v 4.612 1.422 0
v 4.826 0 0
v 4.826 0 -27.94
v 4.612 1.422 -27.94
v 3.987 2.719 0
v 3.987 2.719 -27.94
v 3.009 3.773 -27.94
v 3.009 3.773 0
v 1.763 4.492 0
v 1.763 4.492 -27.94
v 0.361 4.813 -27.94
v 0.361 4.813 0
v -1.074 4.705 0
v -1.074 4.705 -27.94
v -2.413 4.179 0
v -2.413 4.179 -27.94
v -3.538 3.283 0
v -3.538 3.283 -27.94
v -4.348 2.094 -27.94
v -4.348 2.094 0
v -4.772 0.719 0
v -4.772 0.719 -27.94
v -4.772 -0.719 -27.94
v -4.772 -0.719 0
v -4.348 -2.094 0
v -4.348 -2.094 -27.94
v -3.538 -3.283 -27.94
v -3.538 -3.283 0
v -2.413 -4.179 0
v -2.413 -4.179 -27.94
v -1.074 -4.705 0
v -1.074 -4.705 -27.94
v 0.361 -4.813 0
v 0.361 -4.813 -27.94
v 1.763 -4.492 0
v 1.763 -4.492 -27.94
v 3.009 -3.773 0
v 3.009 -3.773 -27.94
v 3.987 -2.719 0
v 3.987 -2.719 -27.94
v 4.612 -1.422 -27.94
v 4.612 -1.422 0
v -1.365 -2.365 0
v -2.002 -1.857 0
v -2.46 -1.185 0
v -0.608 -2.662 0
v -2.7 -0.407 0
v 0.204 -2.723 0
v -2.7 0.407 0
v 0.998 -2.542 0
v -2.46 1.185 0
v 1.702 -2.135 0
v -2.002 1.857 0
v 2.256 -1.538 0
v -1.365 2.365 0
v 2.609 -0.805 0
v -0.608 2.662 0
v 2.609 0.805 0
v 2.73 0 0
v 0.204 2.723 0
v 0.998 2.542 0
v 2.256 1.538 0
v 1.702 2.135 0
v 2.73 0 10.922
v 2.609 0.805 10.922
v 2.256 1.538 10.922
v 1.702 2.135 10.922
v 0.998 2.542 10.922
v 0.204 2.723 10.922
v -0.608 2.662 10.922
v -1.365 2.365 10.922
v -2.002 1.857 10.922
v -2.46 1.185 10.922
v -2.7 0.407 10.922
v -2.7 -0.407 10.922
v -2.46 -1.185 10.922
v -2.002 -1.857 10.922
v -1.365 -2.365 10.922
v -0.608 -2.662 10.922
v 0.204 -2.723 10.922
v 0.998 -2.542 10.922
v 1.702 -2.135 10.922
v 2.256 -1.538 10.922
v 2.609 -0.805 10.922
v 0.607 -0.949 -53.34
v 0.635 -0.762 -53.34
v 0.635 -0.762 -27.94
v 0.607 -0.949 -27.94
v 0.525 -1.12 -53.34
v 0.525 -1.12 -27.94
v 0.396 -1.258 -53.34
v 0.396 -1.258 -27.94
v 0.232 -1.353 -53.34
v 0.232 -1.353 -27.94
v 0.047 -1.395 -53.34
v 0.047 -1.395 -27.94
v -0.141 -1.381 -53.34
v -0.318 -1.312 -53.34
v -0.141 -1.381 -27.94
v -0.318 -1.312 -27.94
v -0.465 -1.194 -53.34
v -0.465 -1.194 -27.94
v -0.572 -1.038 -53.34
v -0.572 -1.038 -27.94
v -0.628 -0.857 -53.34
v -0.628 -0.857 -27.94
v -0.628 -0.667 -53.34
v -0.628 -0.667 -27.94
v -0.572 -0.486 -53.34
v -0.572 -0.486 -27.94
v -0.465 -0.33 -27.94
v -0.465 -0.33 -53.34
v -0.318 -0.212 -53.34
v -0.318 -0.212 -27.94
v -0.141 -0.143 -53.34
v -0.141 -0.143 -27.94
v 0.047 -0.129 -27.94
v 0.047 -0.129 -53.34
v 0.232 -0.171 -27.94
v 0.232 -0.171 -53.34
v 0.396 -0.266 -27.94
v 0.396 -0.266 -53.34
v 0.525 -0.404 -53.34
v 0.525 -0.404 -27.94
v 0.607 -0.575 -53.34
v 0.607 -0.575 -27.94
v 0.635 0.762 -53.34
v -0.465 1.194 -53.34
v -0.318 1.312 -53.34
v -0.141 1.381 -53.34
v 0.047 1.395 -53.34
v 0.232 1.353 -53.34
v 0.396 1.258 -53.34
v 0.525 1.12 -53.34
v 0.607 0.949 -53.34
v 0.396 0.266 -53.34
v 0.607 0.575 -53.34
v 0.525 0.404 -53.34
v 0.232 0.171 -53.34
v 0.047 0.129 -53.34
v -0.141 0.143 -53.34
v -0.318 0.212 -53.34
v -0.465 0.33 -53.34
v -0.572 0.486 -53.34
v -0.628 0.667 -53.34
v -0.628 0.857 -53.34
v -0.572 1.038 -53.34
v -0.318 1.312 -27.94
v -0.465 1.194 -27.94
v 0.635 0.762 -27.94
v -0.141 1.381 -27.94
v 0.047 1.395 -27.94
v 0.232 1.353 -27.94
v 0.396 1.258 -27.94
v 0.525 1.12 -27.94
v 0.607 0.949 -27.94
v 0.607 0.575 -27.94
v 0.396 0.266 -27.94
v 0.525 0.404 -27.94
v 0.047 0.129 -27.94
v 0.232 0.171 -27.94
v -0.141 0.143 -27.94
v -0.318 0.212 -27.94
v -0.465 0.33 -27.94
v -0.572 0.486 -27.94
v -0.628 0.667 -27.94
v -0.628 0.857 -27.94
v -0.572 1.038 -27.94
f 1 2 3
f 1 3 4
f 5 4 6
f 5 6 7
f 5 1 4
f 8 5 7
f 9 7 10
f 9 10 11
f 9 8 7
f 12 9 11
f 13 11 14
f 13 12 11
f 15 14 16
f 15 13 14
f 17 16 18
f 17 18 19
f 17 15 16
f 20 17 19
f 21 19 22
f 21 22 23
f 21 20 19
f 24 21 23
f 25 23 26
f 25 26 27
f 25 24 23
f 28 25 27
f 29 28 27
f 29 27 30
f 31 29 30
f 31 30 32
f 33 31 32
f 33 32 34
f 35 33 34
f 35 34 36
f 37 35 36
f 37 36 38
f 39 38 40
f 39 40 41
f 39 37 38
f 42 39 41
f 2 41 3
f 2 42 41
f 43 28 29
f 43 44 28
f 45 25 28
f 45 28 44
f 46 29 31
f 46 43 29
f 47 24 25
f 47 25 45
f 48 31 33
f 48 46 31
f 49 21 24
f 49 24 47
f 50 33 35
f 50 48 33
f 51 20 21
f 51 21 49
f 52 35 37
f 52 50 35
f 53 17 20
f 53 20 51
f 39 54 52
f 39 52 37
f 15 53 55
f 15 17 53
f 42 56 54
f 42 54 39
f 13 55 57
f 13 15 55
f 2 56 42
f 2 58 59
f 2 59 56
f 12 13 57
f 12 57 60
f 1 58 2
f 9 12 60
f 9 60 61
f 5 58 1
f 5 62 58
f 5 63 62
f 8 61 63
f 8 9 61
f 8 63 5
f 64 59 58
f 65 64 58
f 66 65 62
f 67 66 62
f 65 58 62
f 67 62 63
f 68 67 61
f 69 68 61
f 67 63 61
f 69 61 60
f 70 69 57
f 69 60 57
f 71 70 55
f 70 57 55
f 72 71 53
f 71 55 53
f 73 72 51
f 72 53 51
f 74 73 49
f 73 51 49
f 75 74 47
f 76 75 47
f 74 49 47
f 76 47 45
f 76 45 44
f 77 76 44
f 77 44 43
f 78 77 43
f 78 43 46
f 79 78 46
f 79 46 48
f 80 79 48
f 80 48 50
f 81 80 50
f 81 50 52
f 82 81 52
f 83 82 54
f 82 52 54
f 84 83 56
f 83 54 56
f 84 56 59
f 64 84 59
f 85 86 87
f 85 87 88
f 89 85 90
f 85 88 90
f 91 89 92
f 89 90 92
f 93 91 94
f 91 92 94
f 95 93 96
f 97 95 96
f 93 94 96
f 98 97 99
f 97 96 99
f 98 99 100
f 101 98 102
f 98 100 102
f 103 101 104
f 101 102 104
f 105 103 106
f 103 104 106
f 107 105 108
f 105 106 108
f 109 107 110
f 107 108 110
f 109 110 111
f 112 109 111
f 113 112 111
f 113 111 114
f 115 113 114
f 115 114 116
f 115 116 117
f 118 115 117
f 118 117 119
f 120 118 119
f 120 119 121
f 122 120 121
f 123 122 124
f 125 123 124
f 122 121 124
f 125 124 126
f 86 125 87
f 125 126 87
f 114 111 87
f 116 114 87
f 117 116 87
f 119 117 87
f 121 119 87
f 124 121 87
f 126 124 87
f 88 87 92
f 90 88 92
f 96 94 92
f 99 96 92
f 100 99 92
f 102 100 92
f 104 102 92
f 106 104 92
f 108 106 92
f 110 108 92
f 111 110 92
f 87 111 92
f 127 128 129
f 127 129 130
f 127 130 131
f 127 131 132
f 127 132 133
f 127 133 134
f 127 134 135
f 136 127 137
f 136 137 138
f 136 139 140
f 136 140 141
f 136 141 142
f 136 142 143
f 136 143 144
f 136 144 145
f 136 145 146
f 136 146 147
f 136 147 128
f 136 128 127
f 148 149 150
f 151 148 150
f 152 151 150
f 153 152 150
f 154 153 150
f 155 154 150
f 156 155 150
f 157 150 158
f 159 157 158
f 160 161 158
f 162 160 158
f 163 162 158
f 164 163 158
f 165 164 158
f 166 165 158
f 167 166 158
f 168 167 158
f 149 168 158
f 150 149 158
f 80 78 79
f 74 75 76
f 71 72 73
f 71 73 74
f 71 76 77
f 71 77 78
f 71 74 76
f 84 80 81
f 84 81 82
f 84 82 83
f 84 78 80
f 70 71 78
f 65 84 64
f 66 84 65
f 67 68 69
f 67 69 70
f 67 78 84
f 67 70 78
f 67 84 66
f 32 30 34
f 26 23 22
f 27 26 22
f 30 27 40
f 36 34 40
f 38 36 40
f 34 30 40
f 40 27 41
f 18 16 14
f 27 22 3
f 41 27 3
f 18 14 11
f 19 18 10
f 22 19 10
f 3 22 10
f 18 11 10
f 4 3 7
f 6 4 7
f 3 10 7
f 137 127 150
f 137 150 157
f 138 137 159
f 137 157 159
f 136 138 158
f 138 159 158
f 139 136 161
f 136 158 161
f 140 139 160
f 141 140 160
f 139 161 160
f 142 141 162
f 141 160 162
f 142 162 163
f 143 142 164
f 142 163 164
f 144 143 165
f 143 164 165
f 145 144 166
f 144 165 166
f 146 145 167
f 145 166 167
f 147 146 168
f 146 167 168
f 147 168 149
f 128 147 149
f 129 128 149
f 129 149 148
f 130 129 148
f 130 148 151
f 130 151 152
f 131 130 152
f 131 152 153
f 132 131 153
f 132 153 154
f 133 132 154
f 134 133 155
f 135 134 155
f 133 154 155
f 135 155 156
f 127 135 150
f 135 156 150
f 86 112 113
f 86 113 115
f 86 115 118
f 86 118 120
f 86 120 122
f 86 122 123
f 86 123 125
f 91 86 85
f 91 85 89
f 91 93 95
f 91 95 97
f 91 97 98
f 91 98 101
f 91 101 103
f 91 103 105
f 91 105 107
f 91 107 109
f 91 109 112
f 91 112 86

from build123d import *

# Parameters (mm, degrees)
F0_R     = 2.7305
F1_DEPTH = 10.922
F0_R_2   = 4.826
F2_DEPTH = 27.94
F3_R     = 0.635
F4_DEPTH = 25.4


with BuildPart() as f1:
    # F0 (on Top) → F1 (new body)
    with BuildSketch(Plane.XY):
        Circle(F0_R)
    extrude(amount=F1_DEPTH)

    # F0 (on Top) → F2 (join)
    with BuildSketch(Plane.XY):
        Circle(F0_R_2)
        Circle(F0_R, mode=Mode.SUBTRACT)
        Circle(F0_R)
    extrude(amount=-F2_DEPTH)


with BuildPart() as f4:
    # F3 (on face) → F4 (new body)
    with BuildSketch(Plane(origin=(0, 0, -27.94), x_dir=(1, 0, 0), z_dir=(0, 0, -1))):
        with Locations((0, -0.762)):
            Circle(F3_R)
        with Locations((0, 0.762)):
            Circle(F3_R)
    extrude(amount=F4_DEPTH)


solid = Compound([f1.part, f4.part])
